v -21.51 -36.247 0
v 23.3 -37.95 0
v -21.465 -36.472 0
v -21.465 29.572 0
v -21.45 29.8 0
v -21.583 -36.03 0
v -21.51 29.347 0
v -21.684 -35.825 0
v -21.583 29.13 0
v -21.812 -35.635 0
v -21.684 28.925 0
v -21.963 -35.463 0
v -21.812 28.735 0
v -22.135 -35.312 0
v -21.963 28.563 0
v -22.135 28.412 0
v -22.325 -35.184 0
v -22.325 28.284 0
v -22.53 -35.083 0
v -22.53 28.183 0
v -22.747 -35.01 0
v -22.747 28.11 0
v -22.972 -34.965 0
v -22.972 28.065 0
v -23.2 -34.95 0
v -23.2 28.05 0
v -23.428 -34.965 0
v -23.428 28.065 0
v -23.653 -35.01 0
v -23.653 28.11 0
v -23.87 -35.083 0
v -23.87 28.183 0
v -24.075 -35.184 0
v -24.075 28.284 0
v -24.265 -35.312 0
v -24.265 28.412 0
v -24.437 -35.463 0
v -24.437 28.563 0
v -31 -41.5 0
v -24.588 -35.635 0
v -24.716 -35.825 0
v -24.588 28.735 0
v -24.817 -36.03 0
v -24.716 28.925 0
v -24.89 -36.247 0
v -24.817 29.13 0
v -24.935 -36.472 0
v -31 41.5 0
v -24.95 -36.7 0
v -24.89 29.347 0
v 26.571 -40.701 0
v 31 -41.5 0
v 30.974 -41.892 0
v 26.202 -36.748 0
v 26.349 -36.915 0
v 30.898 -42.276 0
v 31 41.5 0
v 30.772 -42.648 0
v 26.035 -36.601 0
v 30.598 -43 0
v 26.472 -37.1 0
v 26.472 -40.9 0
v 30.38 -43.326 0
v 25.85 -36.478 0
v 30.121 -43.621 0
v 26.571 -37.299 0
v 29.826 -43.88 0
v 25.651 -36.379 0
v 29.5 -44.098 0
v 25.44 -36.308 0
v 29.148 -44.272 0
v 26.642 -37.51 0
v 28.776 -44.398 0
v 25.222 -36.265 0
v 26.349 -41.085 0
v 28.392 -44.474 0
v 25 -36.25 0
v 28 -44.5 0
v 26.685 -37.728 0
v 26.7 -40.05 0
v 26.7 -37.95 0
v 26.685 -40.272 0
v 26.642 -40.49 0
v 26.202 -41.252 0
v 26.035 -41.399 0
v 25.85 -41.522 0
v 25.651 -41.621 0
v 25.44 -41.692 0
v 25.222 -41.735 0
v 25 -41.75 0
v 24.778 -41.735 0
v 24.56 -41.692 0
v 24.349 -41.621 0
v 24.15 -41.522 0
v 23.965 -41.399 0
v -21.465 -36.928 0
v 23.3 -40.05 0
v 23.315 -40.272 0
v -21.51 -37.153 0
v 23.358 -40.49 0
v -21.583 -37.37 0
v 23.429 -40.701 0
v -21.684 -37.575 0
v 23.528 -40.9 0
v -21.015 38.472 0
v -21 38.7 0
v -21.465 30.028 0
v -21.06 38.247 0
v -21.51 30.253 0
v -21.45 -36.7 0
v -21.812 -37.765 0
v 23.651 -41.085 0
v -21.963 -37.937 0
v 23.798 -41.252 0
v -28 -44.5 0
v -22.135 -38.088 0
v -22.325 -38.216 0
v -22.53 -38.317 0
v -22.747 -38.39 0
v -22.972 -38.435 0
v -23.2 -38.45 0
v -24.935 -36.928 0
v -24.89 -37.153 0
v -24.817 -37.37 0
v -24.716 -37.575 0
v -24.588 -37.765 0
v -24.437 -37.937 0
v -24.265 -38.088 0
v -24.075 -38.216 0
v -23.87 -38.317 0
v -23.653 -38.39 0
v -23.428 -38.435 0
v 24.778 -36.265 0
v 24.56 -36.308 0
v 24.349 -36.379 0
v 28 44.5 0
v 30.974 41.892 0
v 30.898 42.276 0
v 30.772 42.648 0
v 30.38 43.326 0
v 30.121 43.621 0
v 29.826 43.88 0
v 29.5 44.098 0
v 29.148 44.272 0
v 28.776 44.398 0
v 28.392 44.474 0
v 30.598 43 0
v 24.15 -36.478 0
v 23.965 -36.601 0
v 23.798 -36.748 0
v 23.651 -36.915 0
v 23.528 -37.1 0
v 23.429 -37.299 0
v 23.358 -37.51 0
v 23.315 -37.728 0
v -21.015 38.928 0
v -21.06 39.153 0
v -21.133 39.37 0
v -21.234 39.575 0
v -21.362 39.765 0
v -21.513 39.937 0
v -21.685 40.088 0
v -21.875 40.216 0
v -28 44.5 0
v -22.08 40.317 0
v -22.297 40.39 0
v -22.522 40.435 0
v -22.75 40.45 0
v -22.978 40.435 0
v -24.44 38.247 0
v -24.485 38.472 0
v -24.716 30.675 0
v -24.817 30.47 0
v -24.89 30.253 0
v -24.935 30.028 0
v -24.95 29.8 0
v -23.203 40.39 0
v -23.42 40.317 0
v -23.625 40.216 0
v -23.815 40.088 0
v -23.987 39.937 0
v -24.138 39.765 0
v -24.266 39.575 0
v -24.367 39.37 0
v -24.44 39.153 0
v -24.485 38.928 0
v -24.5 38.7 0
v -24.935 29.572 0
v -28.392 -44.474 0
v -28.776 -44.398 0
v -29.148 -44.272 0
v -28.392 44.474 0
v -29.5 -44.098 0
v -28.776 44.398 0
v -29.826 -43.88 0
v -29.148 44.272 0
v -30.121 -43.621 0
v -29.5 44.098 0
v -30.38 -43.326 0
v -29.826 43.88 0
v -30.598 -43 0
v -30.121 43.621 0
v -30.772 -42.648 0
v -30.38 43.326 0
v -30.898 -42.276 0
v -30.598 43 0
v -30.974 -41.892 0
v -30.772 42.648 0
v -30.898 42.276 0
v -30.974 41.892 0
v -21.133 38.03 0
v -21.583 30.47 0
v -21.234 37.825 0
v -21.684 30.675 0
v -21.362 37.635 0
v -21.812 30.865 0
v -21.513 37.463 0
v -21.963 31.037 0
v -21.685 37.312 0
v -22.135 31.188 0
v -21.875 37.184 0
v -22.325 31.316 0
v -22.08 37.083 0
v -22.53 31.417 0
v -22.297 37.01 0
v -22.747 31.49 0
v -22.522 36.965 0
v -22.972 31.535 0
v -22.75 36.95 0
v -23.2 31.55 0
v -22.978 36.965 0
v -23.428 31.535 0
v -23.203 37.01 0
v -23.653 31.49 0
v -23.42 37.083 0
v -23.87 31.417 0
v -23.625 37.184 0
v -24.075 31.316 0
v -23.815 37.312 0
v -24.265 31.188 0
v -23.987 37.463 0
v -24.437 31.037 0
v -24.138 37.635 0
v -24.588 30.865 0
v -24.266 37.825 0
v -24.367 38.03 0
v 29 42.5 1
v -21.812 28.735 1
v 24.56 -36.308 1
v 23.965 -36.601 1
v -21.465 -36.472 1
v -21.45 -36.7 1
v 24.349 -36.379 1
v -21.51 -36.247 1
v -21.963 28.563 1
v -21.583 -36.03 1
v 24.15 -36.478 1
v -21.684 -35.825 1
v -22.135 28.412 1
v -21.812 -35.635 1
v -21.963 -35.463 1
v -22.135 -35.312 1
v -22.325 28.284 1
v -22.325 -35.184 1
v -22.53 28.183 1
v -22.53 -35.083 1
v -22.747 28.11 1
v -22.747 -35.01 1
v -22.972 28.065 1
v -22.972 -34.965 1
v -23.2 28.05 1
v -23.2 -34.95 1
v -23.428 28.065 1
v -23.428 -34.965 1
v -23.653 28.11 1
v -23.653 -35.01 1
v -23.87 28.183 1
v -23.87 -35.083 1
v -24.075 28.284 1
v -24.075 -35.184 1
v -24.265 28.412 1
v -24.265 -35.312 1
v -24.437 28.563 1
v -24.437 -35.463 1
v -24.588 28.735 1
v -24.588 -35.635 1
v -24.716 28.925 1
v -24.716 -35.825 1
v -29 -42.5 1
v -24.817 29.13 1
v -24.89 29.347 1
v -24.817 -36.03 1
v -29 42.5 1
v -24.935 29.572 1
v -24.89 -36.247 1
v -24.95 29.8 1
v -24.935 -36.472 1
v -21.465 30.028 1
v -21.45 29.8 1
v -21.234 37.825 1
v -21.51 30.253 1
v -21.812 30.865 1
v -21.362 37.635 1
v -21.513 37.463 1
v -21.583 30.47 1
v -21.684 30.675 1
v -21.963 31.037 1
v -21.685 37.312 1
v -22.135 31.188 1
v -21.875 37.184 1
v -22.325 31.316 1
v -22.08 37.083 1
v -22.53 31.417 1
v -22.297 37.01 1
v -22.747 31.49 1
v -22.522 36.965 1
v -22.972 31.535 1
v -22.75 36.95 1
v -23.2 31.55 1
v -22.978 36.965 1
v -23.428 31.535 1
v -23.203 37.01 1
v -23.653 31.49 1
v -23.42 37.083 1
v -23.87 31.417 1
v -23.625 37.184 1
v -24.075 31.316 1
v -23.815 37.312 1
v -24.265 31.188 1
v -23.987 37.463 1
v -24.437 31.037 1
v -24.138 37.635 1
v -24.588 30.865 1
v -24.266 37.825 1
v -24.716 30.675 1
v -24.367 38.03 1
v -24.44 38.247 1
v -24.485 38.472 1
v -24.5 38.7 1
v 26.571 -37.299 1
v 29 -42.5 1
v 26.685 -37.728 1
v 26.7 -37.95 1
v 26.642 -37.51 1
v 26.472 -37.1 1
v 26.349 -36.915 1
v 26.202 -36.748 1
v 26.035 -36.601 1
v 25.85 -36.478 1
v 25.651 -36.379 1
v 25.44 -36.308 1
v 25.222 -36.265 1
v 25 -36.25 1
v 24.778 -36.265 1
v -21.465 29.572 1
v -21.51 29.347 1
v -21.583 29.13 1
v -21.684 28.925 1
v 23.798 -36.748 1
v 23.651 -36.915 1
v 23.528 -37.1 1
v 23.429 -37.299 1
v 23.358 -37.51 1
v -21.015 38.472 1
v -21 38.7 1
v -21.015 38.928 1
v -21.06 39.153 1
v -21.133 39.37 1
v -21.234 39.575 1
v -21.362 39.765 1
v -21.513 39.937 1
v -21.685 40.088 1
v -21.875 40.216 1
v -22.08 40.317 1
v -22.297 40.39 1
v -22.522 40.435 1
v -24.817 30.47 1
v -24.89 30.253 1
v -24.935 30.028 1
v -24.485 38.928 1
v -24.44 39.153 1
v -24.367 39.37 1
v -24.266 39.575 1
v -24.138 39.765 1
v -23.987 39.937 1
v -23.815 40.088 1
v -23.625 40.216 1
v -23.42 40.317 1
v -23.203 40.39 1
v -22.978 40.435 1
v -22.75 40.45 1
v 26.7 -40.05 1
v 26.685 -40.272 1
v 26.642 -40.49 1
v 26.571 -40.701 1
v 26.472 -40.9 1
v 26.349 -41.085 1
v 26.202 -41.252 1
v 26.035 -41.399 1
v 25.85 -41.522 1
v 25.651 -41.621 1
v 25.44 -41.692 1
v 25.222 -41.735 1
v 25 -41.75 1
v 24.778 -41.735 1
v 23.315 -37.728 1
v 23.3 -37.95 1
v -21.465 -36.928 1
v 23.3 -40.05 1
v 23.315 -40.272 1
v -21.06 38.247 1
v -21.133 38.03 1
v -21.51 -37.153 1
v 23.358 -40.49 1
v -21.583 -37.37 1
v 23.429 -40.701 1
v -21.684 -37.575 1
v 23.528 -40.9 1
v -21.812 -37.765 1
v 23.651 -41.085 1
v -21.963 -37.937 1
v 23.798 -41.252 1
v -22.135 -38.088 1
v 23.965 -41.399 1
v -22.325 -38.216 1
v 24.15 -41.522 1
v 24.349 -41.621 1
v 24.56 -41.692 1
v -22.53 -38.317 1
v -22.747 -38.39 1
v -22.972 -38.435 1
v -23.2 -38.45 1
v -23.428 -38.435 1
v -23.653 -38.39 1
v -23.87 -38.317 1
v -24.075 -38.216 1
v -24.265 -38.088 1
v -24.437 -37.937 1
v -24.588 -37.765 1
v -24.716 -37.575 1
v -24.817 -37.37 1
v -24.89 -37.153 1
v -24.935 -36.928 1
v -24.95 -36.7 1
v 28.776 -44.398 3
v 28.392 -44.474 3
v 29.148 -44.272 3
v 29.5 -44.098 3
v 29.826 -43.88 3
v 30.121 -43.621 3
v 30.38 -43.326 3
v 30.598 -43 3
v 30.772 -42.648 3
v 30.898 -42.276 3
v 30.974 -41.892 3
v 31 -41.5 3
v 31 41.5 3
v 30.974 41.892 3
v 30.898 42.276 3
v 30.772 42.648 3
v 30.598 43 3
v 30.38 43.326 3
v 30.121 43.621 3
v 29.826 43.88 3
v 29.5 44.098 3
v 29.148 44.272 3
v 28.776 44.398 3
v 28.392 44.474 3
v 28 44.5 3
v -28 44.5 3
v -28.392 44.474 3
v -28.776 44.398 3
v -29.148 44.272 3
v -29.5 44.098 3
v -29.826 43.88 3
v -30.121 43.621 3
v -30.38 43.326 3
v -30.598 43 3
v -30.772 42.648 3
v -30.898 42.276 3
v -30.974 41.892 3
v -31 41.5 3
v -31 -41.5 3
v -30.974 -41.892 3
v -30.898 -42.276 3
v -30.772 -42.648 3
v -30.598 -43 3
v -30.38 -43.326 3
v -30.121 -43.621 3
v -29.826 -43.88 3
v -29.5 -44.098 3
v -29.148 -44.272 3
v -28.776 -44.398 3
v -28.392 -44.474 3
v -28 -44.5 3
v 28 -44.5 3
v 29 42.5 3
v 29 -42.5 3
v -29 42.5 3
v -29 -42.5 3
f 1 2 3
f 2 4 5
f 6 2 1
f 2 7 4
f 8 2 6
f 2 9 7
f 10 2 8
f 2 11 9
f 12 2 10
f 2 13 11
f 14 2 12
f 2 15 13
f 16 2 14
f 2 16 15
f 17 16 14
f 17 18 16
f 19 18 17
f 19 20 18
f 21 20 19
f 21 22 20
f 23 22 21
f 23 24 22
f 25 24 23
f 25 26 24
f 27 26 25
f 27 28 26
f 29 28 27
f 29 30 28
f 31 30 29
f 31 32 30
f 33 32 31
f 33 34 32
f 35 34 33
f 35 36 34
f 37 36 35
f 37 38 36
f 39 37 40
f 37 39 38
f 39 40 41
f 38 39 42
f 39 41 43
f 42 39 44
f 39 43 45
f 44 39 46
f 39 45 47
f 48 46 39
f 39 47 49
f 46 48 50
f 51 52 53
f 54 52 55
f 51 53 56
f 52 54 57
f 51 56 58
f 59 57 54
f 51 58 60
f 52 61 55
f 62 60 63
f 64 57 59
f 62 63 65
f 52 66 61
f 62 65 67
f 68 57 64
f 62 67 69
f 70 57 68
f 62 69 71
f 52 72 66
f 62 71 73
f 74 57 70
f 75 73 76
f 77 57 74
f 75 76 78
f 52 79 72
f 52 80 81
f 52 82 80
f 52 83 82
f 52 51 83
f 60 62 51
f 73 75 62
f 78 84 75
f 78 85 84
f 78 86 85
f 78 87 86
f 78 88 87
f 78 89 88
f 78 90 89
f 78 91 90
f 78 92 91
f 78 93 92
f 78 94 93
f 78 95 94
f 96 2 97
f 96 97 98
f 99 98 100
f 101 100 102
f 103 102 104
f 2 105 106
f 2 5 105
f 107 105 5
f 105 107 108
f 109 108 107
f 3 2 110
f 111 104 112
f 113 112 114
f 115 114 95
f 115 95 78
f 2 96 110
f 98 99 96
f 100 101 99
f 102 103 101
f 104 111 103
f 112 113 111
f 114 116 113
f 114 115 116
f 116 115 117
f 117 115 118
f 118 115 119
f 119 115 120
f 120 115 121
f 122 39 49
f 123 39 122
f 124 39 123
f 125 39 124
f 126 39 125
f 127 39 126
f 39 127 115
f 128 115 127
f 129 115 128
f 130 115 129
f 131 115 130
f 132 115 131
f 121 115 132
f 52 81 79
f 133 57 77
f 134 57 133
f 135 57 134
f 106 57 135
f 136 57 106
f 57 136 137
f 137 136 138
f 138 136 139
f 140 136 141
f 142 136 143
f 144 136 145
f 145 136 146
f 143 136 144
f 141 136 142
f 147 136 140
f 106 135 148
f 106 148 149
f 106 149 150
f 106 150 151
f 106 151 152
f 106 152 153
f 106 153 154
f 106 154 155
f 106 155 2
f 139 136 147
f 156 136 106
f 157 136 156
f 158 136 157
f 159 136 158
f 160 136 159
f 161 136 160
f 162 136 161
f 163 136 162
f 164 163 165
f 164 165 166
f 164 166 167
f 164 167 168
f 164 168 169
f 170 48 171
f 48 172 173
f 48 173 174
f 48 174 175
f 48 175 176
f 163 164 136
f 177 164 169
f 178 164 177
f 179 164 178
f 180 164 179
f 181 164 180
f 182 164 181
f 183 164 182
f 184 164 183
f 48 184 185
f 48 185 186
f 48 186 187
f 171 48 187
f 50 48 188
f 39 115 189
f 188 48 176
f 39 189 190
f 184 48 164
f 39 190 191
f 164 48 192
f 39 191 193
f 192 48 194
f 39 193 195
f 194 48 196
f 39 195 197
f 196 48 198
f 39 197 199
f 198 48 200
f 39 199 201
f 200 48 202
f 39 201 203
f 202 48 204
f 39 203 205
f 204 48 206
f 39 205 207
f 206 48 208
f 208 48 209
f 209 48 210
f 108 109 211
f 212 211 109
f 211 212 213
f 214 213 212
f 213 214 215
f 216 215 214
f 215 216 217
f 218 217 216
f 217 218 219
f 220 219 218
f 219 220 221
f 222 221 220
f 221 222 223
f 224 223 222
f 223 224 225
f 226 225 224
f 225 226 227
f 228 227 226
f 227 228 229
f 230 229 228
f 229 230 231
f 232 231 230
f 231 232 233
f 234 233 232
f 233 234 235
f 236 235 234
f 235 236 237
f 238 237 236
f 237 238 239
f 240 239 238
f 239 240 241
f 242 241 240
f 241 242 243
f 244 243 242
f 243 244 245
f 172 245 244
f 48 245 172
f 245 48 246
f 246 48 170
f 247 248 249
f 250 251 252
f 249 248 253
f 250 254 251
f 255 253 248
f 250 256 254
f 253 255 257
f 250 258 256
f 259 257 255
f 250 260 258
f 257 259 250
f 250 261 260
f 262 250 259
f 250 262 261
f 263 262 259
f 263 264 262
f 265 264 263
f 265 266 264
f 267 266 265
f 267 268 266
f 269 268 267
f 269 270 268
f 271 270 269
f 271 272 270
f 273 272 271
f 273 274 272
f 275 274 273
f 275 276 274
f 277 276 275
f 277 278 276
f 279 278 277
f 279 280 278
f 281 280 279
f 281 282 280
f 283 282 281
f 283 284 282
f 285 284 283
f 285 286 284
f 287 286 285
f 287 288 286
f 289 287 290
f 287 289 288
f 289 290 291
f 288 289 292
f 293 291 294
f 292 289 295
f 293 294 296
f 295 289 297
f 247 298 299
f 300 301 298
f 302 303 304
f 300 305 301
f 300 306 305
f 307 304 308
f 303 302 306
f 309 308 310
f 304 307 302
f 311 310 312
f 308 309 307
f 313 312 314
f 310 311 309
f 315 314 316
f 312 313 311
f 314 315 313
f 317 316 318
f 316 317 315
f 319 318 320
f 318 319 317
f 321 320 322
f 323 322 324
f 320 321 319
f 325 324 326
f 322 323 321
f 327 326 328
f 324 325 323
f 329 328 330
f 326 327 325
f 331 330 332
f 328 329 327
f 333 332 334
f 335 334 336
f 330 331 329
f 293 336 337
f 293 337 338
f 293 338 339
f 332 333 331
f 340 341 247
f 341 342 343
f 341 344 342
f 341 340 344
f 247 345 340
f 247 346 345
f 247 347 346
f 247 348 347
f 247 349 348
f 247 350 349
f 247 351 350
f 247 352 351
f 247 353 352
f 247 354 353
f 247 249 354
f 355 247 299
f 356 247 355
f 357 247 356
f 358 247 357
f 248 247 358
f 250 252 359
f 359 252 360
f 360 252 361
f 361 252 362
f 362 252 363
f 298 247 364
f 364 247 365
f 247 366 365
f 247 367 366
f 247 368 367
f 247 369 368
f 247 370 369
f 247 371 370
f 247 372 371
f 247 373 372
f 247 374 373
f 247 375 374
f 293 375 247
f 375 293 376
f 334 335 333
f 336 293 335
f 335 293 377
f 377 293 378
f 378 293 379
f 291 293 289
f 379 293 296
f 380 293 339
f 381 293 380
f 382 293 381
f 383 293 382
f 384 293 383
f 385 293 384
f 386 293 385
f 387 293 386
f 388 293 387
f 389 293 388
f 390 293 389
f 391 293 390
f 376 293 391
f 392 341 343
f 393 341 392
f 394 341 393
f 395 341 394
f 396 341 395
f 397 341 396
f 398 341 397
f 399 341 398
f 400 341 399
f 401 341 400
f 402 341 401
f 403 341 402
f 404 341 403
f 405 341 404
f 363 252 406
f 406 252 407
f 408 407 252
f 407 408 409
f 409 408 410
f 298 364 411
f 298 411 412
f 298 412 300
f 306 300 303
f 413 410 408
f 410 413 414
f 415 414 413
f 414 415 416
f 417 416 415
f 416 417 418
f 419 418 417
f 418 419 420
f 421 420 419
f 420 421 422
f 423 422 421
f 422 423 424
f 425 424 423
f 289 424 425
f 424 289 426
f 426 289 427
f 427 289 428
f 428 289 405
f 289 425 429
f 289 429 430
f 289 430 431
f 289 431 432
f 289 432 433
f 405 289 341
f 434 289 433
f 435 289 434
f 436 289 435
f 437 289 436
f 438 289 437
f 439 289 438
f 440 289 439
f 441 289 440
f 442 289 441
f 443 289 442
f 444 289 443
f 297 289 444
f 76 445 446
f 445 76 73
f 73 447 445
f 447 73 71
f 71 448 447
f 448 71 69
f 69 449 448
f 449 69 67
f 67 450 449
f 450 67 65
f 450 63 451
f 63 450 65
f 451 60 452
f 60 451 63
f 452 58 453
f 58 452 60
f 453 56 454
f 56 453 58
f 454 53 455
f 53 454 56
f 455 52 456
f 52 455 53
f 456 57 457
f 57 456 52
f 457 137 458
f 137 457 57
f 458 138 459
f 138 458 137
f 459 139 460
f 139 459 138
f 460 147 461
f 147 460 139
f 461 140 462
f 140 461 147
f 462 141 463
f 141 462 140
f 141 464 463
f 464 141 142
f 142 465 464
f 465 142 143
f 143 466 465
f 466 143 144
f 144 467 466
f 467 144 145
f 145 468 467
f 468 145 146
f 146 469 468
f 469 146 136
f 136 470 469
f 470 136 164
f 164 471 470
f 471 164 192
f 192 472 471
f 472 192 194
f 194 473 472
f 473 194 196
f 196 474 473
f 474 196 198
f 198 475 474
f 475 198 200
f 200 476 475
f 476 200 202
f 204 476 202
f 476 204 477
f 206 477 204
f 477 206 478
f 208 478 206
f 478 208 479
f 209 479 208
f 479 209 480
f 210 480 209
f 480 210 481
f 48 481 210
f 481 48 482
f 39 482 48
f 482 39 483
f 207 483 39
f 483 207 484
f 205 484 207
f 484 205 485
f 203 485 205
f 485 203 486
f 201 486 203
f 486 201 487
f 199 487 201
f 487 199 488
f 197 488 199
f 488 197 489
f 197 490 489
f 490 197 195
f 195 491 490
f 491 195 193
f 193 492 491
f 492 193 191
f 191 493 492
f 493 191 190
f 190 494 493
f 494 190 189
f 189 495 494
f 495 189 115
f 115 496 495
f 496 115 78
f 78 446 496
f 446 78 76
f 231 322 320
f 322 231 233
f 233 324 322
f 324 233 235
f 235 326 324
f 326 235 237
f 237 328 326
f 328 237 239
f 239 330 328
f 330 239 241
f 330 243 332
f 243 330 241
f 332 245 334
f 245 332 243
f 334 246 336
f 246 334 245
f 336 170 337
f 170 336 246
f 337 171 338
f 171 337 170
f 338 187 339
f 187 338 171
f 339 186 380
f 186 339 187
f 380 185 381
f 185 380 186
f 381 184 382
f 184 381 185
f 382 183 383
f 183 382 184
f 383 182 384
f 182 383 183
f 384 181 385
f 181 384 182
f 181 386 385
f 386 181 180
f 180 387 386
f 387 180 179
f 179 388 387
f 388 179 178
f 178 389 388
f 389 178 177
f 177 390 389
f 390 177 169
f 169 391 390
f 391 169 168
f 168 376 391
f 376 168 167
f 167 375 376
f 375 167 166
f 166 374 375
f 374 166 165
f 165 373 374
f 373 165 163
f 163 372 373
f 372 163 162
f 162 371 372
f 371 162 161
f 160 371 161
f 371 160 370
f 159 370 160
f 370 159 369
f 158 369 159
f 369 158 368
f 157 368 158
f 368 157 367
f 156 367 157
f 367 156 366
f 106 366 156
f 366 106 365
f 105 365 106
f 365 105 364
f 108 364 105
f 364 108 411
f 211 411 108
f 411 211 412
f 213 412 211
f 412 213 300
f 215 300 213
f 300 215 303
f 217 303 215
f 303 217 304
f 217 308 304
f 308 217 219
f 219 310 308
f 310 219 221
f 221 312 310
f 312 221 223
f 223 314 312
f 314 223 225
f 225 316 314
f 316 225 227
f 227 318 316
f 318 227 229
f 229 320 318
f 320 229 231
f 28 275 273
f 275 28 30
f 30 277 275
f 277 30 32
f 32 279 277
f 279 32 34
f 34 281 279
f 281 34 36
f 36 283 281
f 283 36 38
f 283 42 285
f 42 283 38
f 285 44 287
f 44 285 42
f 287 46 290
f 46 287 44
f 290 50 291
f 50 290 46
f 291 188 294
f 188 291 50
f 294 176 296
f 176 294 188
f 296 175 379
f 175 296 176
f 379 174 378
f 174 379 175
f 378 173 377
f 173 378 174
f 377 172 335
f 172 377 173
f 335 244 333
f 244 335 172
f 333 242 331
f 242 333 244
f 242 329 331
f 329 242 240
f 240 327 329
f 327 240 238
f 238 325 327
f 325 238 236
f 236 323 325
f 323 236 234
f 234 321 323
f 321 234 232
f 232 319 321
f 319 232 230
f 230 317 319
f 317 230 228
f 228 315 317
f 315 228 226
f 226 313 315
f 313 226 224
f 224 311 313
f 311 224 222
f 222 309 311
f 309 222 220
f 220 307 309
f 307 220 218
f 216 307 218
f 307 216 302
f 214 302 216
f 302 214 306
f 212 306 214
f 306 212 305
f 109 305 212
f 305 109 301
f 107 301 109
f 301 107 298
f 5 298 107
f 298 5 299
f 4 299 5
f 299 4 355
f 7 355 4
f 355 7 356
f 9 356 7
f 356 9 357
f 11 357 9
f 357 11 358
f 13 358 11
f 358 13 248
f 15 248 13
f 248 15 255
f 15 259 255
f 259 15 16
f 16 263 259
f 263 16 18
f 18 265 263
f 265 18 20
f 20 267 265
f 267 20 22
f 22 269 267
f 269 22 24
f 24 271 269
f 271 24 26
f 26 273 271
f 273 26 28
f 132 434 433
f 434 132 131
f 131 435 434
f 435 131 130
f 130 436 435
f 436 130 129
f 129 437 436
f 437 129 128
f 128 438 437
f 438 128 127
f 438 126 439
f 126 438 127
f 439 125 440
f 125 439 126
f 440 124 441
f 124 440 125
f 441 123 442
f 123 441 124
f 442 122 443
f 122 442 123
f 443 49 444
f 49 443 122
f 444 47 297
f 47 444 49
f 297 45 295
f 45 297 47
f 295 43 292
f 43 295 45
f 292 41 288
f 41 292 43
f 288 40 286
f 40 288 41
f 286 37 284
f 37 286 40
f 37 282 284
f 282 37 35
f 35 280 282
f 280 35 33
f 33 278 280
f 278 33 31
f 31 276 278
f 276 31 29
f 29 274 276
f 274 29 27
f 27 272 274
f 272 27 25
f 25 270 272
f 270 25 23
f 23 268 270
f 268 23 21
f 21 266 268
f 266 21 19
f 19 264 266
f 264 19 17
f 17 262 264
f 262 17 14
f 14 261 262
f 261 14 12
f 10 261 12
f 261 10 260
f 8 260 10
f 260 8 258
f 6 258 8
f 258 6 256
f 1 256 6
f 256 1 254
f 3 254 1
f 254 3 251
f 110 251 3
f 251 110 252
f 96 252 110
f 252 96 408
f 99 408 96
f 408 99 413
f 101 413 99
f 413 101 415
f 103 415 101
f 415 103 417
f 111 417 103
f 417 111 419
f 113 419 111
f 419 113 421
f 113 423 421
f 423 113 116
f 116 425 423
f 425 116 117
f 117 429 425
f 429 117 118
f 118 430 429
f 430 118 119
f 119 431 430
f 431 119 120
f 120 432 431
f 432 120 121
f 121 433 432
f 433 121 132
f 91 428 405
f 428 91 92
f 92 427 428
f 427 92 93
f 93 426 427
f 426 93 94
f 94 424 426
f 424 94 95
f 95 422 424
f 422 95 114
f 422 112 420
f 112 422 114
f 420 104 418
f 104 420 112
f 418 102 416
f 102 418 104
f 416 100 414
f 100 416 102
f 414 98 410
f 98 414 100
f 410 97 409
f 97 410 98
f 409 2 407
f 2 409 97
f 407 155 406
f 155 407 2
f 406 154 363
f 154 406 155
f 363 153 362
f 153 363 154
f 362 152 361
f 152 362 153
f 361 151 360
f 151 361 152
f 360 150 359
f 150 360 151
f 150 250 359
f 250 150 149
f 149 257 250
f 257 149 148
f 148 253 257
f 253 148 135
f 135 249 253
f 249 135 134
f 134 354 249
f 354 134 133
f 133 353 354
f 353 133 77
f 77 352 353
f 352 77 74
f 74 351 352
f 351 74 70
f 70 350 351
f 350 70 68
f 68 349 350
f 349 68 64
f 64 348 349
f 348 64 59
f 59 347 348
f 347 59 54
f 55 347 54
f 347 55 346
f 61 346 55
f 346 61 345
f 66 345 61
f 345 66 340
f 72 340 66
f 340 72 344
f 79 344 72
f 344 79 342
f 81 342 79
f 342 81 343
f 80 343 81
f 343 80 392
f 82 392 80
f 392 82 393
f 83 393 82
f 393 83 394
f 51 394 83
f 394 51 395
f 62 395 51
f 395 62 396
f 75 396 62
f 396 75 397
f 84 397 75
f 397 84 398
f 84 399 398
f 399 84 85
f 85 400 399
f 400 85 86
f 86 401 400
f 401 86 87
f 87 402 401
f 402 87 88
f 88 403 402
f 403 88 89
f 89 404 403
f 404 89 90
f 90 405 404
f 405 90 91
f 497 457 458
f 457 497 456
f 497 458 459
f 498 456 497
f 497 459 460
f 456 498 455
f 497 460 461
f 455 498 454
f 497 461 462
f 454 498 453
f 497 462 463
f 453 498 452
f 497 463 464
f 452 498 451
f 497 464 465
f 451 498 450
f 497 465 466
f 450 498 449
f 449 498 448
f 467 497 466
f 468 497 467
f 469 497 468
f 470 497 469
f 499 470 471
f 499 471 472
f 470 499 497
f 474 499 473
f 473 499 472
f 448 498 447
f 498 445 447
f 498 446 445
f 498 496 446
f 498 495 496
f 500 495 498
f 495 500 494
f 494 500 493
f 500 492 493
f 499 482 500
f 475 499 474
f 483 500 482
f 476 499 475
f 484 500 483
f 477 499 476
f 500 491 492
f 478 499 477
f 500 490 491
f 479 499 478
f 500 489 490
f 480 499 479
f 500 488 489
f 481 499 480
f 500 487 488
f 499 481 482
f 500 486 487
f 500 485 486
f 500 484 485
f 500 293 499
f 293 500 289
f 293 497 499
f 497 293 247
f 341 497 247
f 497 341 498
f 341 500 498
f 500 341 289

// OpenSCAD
// file: model.scad
// DIN-rail (TS35) mount for a 58 x 85 mm enclosed AC-DC supply: PROTOTYPE, flat back, no clips yet.
// A 2.5 mm solid plate the PSU's own size, screwed (M3) to its two diagonal holes, with cut-outs for the PSU's
// pill and a loose hole where its U slot mates. A lip 8 mm tall runs round all four sides of the PSU, square-cornered inside, rounded outside; it is a thin wall
// except on the lower (-Y) side, where a 33.5 mm stretch (8.5 mm from the left edge) is a 15 mm wide, 8 mm tall shelf with two chamfered zip-tie slot pairs through it:
// a cord (one AC, one DC) leaves the PSU straight down and lies on the shelf, held by a zip tie through a slot pair either side of it.
// Print flat back down (z = 0): the PSU sits on the plate's top face inside the lip, a pocket 8 mm deep.
// The DIN clips (Printables 420009, ref_din_clip_heat_insert.stl) are removed for now; see git history.

/* [Plate] */
plate_l = 58;        // X, along the rail: the PSU's footprint (box, caliper), no overhang
plate_w = 85;        // Y, across the rail (the vertical, long side): the PSU's footprint
ext = 15;            // the lower (-Y) lip is this wide, measured from the PSU's edge: the strain-relief shelf
shelf_len = 33.5;    // the shelf runs this far along X; the rest of the lower edge is the thin lip
shelf_x = -plate_l/2 + 8.5;   // the shelf starts 8.5 mm in from the PSU's left edge (left in the top-down view)
plate_t = 2.5;       // the frame
corner_r = 3;       // outside corners of the lip
fillet_r = 4;        // where the shelf meets the thin lip, and the shelf's own outer corners

/* [Lip] the PSU sits in a pocket, the lip rises from the PSU (top) face of the plate */
lip_h = 8;           // lip height above the top face of the plate
lip_t = 2;           // lip wall thickness on the three thin sides, outside the PSU's own footprint

/* [PSU mounting features] (caliper ~; x right, y toward the back, centred on the footprint, left = left in normal view) */
hole_d = 3.5;        // M3, easy slip fit; the head bears on the rail side
slot_w = 3.4;        // the PSU's U slot and pill width (~)
holes = [[-23.2, -36.7], [-23.2, 29.8]];   // blind holes in the PSU underside: fit test 1 moved each 1 mm in X (to centre) and 1 mm in Y (toward each other)
top_hole = [-22.75, 38.7];  // loose M3 hole where the PSU's U slot mates (not a slot in the mount); fit test 1 moved it 0.75 mm toward the centre
pill = [25, -39];    // closed pill, 5.5 long tip to tip, long axis along Y (guess); fit test 1 moved it 1.5 mm to the outer edge (+X) and 1.5 mm down (-Y)
pill_len = 5.5;

/* [Zip-tie strain relief: slot pairs through the shelf and plate; the cable lies on top of the shelf, the tie loops under the back] */
tie_w = 5.5;         // slot length across the tie: takes ties up to 5 mm wide (standard), small ones too
tie_t = 2.2;         // slot width
tie_gap = 8;         // slot centre to slot centre, along X: the cord (~5-7 mm, guess) lies between them, running along Y
tie_c = 1.2;         // underside chamfer on each slot's outer edge, where the tie turns under the back
tie_ri = 2.5;        // roundover radius on each slot's inner (web-side) bottom edge: the tie pulls in and around it under the back
tie_off = 8;         // the two pairs sit this far either side of the shelf centre
tie_xs = [shelf_x + shelf_len/2 - tie_off, shelf_x + shelf_len/2 + tie_off];  // pair positions along X

/* [Gauge] part = "gauge": a thin fit-check print: same outline minus the shelf, same holes, short lip, no tie slots */
part = "mount";      // [mount, gauge]
gauge_t = 1;         // gauge plate thickness
gauge_lip = 2;       // gauge lip height above the plate's top face

/* [Hidden] */
$fn = 48;

tie_y = -plate_w/2 - ext/2;   // the slot pairs centre line, mid-shelf
// the pocket is the PSU's own square-cornered footprint; only the outside is rounded
module pocket() square([plate_l, plate_w], center = true);
// outer edge: lip_t round the PSU, rounded corners; on the lower side a shelf ext wide for shelf_len along X
module outline_raw() union() {
    offset(r = corner_r) square([plate_l + 2*lip_t - 2*corner_r, plate_w + 2*lip_t - 2*corner_r], center = true);
    translate([shelf_x, -plate_w/2 - ext]) square([shelf_len, ext + corner_r]);
}
// every outside corner rounded (convex), every inside corner where the shelf meets the thin lip filleted (concave)
module outline() offset(r = -fillet_r) offset(delta = fillet_r) offset(r = corner_r) offset(delta = -corner_r) outline_raw();

// the PSU's pill as a plate cut-out (closed slot); the top hole is a plain loose M3 hole
module slots2d() {
    translate(top_hole) circle(d = hole_d);
    hull() for (s = [-1, 1]) translate([pill[0], pill[1] + s*(pill_len - slot_w)/2]) circle(d = slot_w);
}

// A cord leaves the PSU's lower edge straight down (-Y) and lies on the shelf; each pair of slots straddles it, slot length
// along Y (across the tie), slot width along X. s = -1 / +1 is the left / right slot of a pair, its chamfer opening away
// from the web between them.
module tie_chamfers() {
    for (x = tie_xs, s = [-1, 1]) translate([x + s*tie_gap/2, tie_y]) hull() {
        translate([s*tie_c/2, 0, -0.5]) linear_extrude(0.5) square([tie_t + tie_c, tie_w], center = true);
        translate([0, 0, tie_c]) linear_extrude(0.01) square([tie_t, tie_w], center = true);
    }
}

// roundover on the web-side bottom edge of each slot, so the tie bends round a curve, not a sharp corner
module tie_roundovers() {
    for (x = tie_xs, s = [-1, 1]) translate([x + s*tie_gap/2 - s*tie_t/2, tie_y, 0]) rotate([90, 0, 0])
        linear_extrude(tie_w, center = true) scale([-s, 1]) difference() {
            translate([-0.01, -0.5]) square([tie_ri + 0.01, tie_ri + 0.5]);
            translate([tie_ri, tie_ri]) circle(r = tie_ri);
        }
}

// whole-height cuts (they pass through the shelf and the plate); z = 0 is the flat back
module tie_slots() { for (x = tie_xs, s = [-1, 1]) translate([x + s*tie_gap/2, tie_y, -1]) linear_extrude(lip_h + plate_t + 2) square([tie_t, tie_w], center = true); }

module gauge() {
    linear_extrude(gauge_t) difference() {
        offset(r = corner_r) square([plate_l + 2*lip_t - 2*corner_r, plate_w + 2*lip_t - 2*corner_r], center = true);
        for (h = holes) translate(h) circle(d = hole_d);
        slots2d();
    }
    translate([0, 0, gauge_t - 0.01]) linear_extrude(gauge_lip + 0.01) difference() {
        offset(r = corner_r) square([plate_l + 2*lip_t - 2*corner_r, plate_w + 2*lip_t - 2*corner_r], center = true);
        pocket();
    }
}

module mount() {
    difference() {
        union() {
            linear_extrude(plate_t) difference() {                                   // the flat back, z = 0 is the rail side
                outline();
                for (h = holes) translate(h) circle(d = hole_d);
                slots2d();
            }
            translate([0, 0, plate_t - 0.01]) linear_extrude(lip_h + 0.01) difference() { outline(); pocket(); }   // the lip, rising from the PSU side
        }
        tie_slots();
        tie_chamfers();
        tie_roundovers();
    }
}

if (part == "gauge") gauge(); else mount();
// main file
// Fit-check gauge: built from model.scad as its own part.
include <model.scad>
part = "gauge";
